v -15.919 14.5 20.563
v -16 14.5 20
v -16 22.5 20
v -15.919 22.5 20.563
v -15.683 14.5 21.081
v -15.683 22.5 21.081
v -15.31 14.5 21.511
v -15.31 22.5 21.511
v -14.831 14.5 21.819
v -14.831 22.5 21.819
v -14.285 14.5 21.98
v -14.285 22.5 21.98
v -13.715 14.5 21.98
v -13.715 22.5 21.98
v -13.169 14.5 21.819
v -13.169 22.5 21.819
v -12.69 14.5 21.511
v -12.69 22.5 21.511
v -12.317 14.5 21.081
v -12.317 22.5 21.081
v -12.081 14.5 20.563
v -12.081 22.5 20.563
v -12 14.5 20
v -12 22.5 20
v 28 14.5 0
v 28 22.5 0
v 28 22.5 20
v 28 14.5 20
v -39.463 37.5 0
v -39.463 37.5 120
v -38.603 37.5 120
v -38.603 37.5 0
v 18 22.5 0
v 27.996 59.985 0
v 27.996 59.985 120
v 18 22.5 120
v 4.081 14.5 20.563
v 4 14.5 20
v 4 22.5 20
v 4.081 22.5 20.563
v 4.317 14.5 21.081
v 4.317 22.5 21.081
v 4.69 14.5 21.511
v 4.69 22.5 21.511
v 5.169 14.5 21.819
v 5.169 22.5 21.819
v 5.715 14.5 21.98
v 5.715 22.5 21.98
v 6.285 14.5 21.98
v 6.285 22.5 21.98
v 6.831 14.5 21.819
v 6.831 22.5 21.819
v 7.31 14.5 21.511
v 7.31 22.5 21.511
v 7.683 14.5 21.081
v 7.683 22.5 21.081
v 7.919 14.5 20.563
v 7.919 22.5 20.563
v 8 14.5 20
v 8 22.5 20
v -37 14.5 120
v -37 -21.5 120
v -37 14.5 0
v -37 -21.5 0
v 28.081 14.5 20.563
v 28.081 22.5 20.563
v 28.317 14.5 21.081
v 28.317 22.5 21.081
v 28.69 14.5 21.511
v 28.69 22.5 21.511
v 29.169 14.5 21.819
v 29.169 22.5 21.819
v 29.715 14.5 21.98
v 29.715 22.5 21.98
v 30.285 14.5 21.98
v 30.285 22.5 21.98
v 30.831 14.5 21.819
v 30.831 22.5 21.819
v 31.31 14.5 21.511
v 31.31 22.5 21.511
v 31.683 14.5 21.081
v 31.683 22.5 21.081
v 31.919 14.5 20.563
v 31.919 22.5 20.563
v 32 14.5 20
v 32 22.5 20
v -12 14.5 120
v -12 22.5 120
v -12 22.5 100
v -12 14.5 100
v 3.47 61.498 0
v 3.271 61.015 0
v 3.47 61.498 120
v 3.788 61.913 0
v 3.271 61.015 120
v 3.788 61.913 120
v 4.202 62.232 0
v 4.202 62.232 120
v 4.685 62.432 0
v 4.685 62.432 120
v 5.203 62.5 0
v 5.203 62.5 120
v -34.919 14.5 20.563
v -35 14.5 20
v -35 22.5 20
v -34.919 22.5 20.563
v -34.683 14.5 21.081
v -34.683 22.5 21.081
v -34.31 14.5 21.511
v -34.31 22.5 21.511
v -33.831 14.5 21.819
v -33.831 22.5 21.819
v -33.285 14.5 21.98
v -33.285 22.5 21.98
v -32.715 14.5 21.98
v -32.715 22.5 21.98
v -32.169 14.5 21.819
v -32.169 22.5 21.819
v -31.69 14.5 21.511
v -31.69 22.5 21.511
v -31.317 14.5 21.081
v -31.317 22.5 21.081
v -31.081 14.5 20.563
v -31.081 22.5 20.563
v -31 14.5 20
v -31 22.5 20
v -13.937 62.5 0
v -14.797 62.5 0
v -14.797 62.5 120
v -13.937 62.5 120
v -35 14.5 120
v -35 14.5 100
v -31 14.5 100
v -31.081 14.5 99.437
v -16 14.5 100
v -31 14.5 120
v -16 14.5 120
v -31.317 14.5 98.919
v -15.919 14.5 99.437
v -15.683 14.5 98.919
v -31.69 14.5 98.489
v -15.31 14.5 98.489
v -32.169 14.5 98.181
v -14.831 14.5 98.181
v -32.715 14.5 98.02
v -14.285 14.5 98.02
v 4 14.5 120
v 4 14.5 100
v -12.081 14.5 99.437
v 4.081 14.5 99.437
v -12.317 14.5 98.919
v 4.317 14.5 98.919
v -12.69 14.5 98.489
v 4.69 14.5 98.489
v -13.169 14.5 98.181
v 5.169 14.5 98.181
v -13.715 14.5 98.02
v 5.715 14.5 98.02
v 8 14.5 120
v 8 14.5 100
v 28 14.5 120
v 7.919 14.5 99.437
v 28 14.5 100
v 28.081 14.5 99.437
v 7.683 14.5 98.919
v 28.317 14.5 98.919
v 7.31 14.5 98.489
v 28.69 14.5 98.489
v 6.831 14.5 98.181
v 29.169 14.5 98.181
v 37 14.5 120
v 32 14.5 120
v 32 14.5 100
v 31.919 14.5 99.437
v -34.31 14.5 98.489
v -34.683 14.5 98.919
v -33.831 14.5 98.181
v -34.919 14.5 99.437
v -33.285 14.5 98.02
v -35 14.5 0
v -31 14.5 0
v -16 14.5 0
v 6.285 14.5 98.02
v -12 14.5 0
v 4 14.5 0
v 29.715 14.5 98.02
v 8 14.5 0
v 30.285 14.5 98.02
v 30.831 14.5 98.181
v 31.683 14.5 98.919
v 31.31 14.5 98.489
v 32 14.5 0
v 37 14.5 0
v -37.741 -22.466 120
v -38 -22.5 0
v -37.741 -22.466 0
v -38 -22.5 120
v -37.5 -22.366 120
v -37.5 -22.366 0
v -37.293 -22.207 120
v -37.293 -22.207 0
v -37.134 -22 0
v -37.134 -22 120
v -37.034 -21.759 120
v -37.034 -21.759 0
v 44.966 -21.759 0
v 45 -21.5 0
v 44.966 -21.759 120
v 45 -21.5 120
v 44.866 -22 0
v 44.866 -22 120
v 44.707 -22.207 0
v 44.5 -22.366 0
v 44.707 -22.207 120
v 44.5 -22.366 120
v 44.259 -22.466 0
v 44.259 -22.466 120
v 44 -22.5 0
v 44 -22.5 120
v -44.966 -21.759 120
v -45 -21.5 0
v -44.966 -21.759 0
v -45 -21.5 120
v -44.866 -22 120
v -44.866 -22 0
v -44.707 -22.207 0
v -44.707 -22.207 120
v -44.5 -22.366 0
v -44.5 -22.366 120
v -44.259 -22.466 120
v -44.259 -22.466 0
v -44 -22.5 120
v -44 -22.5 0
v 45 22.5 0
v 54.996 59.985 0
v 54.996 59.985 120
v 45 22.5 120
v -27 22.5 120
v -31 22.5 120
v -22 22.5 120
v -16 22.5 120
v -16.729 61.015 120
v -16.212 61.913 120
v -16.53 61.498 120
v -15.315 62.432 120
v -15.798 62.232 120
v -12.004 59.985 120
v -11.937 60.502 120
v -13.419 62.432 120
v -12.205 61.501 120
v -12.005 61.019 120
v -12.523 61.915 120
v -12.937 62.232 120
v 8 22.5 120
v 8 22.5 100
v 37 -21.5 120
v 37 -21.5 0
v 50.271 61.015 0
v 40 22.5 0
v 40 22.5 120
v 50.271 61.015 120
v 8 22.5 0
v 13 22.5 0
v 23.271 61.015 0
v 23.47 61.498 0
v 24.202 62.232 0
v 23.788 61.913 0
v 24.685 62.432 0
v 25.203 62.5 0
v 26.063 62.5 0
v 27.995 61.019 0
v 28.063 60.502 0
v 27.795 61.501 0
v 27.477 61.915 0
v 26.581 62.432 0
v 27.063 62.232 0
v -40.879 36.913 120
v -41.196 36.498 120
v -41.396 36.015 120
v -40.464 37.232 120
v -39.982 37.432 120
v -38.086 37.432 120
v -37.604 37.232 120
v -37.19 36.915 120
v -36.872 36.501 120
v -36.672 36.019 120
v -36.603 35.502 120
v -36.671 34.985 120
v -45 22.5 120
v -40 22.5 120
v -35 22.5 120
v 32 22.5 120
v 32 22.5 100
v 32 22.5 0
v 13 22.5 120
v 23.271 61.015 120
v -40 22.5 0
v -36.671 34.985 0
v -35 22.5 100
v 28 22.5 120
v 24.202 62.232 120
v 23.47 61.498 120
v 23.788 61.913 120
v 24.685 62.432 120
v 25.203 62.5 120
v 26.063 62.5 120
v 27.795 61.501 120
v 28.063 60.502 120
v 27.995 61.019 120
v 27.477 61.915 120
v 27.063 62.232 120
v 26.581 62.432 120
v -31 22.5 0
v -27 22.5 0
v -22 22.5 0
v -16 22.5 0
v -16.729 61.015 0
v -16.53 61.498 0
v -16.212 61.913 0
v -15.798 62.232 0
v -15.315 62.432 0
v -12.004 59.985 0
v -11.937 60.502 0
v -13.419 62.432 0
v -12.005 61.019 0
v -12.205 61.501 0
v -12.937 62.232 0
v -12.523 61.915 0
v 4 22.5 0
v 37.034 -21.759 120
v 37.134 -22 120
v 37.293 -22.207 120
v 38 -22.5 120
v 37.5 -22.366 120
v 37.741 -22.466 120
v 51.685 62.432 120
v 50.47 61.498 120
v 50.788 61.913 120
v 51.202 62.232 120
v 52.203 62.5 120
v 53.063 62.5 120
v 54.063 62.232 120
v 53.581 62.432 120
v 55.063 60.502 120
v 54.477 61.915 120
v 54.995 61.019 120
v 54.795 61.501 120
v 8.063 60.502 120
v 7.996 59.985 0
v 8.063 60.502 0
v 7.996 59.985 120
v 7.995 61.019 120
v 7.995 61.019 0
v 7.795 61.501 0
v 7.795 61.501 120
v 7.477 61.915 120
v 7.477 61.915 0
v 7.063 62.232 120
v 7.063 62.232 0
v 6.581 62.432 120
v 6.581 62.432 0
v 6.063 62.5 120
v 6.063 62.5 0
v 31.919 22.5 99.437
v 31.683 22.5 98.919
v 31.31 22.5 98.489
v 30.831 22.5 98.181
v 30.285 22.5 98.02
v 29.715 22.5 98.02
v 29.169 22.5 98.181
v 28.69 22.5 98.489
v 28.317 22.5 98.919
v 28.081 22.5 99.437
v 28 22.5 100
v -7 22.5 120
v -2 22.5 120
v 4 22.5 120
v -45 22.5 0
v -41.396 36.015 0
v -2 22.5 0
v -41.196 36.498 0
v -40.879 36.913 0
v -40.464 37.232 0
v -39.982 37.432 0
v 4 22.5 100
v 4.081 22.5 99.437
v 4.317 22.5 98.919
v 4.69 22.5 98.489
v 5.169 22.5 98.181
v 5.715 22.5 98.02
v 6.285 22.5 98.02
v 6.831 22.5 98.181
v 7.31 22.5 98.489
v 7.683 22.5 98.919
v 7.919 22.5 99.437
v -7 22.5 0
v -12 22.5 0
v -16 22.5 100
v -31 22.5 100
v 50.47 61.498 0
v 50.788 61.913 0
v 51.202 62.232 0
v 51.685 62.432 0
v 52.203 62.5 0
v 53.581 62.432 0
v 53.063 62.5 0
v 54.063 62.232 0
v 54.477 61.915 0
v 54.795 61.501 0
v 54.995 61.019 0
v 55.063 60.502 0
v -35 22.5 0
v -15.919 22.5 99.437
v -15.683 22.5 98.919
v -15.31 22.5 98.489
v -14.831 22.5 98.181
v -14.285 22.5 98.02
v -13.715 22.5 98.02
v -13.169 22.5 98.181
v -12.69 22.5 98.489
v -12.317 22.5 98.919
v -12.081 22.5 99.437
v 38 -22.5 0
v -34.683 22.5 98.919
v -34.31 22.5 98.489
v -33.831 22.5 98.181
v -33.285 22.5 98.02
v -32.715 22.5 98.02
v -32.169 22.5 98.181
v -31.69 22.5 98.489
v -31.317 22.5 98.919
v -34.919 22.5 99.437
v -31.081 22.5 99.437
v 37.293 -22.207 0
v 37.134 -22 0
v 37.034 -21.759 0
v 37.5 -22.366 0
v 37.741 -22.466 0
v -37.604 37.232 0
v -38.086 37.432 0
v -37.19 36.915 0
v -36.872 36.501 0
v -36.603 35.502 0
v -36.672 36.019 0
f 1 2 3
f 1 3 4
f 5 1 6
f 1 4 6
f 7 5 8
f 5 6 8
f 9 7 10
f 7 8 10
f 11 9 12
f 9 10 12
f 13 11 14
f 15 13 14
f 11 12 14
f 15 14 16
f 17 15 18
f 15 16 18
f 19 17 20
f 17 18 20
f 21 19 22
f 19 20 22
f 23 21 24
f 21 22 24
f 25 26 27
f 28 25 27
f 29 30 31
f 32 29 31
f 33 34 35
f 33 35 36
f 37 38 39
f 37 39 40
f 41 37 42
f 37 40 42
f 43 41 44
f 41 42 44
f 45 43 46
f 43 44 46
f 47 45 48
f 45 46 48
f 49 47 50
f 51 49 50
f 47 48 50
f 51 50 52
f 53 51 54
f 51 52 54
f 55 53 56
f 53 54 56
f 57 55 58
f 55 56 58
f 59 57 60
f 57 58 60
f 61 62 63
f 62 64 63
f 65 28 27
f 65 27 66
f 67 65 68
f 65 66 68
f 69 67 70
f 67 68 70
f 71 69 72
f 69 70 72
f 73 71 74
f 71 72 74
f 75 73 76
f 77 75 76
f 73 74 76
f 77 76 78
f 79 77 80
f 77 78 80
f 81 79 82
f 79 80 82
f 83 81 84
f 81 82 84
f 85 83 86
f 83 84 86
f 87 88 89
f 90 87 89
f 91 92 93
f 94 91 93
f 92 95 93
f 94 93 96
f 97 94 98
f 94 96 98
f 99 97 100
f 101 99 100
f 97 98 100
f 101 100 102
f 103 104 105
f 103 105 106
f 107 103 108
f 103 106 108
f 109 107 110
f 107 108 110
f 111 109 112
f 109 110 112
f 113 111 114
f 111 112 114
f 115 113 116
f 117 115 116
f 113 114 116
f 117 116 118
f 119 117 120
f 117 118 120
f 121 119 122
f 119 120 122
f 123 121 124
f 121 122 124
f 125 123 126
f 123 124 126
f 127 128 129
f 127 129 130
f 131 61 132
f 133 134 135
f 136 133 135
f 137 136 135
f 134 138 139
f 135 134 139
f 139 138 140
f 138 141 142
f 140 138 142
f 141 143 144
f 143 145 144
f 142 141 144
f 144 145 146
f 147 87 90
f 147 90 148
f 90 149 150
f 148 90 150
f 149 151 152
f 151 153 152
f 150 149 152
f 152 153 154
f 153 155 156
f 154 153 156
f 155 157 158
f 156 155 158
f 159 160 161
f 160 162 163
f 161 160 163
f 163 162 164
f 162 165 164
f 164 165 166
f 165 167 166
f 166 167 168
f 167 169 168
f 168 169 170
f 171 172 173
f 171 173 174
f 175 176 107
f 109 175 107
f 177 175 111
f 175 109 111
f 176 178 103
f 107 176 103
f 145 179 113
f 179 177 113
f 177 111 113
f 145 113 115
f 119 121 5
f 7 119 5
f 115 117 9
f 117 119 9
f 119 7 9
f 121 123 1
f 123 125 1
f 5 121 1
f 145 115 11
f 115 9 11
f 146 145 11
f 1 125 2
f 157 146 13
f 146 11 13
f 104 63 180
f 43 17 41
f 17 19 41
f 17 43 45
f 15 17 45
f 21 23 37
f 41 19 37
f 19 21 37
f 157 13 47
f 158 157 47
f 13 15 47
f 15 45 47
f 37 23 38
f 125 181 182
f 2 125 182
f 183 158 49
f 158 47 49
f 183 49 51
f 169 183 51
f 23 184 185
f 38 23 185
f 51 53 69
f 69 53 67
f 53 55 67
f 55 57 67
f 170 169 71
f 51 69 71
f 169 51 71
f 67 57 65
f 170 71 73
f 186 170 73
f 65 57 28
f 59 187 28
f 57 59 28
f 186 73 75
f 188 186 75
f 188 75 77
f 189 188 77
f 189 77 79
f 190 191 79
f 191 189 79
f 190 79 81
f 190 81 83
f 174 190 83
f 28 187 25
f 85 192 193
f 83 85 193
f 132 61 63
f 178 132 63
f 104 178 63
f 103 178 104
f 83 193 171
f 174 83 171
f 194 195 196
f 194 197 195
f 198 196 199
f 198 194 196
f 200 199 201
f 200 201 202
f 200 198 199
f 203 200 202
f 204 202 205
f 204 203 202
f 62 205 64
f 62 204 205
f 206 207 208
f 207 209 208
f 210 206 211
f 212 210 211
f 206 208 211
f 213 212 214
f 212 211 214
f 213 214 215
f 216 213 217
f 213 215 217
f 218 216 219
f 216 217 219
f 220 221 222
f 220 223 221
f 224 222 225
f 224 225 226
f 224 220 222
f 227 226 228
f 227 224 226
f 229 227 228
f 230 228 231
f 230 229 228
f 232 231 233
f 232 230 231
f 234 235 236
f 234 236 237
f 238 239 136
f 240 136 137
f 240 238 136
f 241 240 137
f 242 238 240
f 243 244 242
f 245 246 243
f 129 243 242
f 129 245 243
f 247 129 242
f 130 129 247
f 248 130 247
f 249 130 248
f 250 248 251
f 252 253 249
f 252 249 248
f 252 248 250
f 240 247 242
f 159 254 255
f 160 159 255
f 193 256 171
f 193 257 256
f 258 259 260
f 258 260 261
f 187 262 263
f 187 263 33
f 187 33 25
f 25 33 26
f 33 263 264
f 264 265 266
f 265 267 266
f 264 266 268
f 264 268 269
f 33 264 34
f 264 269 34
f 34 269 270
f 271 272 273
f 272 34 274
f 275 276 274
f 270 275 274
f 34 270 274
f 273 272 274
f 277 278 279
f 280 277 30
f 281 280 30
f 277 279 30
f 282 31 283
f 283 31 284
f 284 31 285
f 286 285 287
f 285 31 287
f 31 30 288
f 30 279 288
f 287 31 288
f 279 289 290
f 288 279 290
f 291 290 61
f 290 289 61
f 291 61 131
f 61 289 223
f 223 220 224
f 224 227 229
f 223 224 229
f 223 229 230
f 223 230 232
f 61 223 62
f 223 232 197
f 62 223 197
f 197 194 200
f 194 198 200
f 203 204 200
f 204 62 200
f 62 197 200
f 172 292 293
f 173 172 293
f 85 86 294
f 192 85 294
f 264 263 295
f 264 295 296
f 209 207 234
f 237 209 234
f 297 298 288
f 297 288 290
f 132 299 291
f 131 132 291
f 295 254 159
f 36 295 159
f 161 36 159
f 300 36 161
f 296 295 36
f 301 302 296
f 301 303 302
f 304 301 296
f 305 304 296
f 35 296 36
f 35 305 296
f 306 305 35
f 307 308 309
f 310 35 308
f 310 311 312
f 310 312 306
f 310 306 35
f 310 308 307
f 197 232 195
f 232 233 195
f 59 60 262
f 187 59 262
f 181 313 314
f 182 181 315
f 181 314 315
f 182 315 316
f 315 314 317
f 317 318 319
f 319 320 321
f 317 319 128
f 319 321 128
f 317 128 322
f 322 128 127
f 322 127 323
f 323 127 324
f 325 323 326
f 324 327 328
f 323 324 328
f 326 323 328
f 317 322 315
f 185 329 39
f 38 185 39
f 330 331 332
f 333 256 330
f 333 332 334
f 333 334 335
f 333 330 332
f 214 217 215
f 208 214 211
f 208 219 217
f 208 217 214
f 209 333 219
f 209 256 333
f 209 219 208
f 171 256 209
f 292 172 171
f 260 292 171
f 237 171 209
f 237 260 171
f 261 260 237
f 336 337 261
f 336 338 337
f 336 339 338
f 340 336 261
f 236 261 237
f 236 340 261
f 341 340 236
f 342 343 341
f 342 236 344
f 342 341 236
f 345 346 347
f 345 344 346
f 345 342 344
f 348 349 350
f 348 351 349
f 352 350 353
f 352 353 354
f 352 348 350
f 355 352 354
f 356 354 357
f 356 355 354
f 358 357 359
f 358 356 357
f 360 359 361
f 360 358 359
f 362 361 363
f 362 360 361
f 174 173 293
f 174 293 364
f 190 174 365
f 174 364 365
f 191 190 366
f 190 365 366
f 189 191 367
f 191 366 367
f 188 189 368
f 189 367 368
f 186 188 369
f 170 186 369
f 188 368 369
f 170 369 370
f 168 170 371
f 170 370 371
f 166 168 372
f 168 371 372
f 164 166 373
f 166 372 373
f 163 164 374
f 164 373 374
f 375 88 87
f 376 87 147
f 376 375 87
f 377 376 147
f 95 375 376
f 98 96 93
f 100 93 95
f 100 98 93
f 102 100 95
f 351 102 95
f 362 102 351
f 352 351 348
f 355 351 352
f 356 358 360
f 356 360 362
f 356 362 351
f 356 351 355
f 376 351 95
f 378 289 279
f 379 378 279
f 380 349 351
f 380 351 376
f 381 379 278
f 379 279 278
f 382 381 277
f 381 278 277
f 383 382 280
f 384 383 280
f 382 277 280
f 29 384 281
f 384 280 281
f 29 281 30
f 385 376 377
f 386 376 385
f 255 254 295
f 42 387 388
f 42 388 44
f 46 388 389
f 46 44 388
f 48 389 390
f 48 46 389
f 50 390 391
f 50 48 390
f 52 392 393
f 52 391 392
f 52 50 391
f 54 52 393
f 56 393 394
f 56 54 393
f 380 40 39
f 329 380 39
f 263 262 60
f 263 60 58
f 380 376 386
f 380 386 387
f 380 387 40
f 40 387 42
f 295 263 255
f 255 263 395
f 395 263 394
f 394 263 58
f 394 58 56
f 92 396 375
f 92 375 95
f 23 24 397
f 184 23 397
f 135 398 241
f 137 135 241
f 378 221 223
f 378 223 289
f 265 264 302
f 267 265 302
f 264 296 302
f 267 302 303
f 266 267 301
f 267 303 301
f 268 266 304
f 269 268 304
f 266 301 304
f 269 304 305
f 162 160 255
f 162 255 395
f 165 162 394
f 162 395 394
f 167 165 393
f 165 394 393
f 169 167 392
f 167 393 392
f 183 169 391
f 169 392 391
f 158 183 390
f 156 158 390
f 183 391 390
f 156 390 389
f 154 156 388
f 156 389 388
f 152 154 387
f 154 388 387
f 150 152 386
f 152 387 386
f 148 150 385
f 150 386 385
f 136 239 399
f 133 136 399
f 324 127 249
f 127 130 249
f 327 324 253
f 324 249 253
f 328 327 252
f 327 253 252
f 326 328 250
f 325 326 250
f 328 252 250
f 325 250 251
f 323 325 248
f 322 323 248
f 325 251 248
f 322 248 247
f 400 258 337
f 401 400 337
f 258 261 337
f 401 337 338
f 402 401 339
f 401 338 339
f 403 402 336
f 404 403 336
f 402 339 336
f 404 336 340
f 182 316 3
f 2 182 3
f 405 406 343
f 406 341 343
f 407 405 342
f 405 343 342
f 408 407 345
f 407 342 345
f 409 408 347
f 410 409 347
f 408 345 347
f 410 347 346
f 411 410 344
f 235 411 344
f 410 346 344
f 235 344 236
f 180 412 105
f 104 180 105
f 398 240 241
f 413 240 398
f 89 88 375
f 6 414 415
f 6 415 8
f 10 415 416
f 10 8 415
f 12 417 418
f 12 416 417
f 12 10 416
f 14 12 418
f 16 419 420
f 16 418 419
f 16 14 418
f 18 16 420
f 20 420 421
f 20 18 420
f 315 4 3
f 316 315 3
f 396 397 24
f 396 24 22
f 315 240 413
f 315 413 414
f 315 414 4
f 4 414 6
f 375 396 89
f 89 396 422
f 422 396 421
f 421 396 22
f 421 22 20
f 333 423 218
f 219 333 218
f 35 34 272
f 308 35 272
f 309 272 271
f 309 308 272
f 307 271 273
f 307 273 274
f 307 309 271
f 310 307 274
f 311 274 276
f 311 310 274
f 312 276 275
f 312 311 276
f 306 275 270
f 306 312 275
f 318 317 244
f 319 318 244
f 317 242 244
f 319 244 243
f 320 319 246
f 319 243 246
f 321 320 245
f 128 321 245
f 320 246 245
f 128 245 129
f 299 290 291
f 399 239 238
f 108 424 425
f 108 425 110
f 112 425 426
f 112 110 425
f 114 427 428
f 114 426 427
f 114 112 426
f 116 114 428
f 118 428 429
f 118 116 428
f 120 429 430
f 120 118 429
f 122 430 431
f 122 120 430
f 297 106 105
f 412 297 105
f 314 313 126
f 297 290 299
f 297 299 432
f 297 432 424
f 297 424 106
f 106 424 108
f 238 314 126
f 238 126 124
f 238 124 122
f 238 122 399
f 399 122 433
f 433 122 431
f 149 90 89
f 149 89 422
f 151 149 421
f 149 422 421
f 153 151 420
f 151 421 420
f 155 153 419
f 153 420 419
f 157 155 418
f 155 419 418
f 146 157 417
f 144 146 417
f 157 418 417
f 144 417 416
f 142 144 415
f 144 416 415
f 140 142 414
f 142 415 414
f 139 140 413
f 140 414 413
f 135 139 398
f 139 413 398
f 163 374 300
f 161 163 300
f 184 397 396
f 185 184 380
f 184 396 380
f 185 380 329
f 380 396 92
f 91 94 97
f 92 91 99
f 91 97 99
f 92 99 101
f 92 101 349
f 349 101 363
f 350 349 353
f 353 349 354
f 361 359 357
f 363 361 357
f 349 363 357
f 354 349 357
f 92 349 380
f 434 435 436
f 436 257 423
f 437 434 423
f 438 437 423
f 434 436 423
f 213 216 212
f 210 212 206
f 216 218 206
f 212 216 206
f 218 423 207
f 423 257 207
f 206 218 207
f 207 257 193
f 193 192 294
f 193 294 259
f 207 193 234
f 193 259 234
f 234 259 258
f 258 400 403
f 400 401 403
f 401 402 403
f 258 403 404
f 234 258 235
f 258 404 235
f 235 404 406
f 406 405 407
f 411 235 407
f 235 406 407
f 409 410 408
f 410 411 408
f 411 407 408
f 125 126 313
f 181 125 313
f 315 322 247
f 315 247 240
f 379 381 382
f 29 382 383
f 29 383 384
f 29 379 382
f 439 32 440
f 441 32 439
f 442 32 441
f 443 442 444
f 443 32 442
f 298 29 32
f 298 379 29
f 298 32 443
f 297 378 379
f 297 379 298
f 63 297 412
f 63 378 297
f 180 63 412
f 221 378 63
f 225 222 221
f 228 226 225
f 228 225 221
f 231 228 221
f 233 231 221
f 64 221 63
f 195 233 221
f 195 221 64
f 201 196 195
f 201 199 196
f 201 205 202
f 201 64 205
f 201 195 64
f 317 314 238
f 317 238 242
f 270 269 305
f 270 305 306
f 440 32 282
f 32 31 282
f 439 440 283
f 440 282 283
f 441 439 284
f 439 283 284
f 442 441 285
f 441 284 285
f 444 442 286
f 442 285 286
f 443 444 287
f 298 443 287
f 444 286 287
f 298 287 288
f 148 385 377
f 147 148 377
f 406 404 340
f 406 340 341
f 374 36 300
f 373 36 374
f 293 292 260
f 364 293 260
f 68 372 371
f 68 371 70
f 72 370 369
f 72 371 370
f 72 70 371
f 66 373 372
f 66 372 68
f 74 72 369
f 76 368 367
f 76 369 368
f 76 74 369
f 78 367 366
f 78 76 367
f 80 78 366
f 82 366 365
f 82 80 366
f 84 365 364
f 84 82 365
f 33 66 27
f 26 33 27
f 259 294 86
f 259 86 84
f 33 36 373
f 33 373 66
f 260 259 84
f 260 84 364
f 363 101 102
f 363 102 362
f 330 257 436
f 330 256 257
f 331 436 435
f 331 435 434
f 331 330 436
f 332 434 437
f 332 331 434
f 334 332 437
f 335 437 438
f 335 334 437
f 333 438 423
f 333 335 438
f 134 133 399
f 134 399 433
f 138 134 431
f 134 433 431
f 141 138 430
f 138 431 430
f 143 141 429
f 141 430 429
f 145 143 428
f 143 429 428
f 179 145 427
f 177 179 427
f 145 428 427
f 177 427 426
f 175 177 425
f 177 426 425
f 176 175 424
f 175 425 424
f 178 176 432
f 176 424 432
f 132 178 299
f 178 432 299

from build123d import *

# Parameters (mm, degrees)
F0_W     = 90
F0_H     = 45
F1_DEPTH = 120
F2_T     = -8
F4_DEPTH = 8
F6_DEPTH = 120
F7_R     = 2
F8_R     = 1


# Not quite as in the source:
# - a feature names something its author has since deleted; it is built from what else it names


with BuildPart() as f1:
    # F0 (on Top) → F1 (new body)
    with BuildSketch(Plane.XY):
        Rectangle(F0_W, F0_H)
    extrude(amount=F1_DEPTH)

    # F2
    f2_openings = [f1.faces().sort_by_distance(p)[0] for p in [
        (0, 0, 120),
        (0, -22.5, 60),
        (0, 0, 0),
    ]]
    offset(amount=F2_T, openings=f2_openings)

    # F3 (on face) → F4 (cut, through all)
    with BuildSketch(Plane(origin=(0, 22.5, 0), x_dir=(-1, 0, 0), z_dir=(0, 1, 0))):
        with BuildLine():
            Line((-32, 20), (-32, 0))
            Line((-32, 0), (-28, 0))
            Line((-28, 0), (-28, 20))
            ThreePointArc((-28, 20), (-30, 22), (-32, 20))
        make_face()
        with BuildLine():
            Line((-8, 20), (-8, 0))
            Line((-8, 0), (-4, 0))
            Line((-4, 0), (-4, 20))
            ThreePointArc((-4, 20), (-6, 22), (-8, 20))
        make_face()
        with BuildLine():
            Line((12, 20), (12, 0))
            Line((12, 0), (16, 0))
            Line((16, 0), (16, 20))
            ThreePointArc((16, 20), (14, 22), (12, 20))
        make_face()
        with BuildLine():
            Line((31, 20), (31, 0))
            Line((31, 0), (35, 0))
            Line((35, 0), (35, 20))
            ThreePointArc((35, 20), (33, 22), (31, 20))
        make_face()
        with BuildLine():
            Line((35, 120), (31, 120))
            Line((31, 120), (31, 100))
            ThreePointArc((31, 100), (33, 98), (35, 100))
            Line((35, 100), (35, 120))
        make_face()
        with BuildLine():
            Line((16, 120), (12, 120))
            Line((12, 120), (12, 100))
            ThreePointArc((12, 100), (14, 98), (16, 100))
            Line((16, 100), (16, 120))
        make_face()
        with BuildLine():
            Line((-4, 120), (-8, 120))
            Line((-8, 120), (-8, 100))
            ThreePointArc((-8, 100), (-6, 98), (-4, 100))
            Line((-4, 100), (-4, 120))
        make_face()
        with BuildLine():
            Line((-28, 120), (-32, 120))
            Line((-32, 120), (-32, 100))
            ThreePointArc((-32, 100), (-30, 98), (-28, 100))
            Line((-28, 100), (-28, 120))
        make_face()
    extrude(amount=-F4_DEPTH, mode=Mode.SUBTRACT)

    # F5 (on face) → F6 (join, through all)
    with BuildSketch(Plane(origin=(0, 0, 0), x_dir=(1, 0, 0), z_dir=(0, 0, -1))):
        Polygon((-40, -22.5), (-45, -22.5), (-41, -37.5), (-36, -37.5), align=None)
        Polygon((-22, -22.5), (-27, -22.5), (-16.3333333333, -62.5), (-11.3333333333, -62.5), align=None)
        Polygon((8.6666666667, -62.5), (-2, -22.5), (-7, -22.5), (3.6666666667, -62.5), align=None)
        Polygon((28.6666666667, -62.5), (18, -22.5), (13, -22.5), (23.6666666667, -62.5), align=None)
        Polygon((45, -22.5), (40, -22.5), (50.6666666667, -62.5), (55.6666666667, -62.5), align=None)
    extrude(amount=-F6_DEPTH)

    # F7
    f7_edges = [f1.edges().sort_by_distance(p)[0] for p in [
        (55.666667, 62.5, 60),
        (50.666667, 62.5, 60),
        (-16.333333, 62.5, 60),
        (3.666667, 62.5, 60),
        (-11.333333, 62.5, 60),
        (-36, 37.5, 60),
        (-41, 37.5, 60),
        (23.666667, 62.5, 60),
        (28.666667, 62.5, 60),
        (8.666667, 62.5, 60),
    ]]
    fillet(f7_edges, radius=F7_R)

    # F8
    f8_edges = [f1.edges().sort_by_distance(p)[0] for p in [
        (-45, -22.5, 60),
        (-37, -22.5, 60),
        (37, -22.5, 60),
        (45, -22.5, 60),
    ]]
    fillet(f8_edges, radius=F8_R)


solid = f1.part
